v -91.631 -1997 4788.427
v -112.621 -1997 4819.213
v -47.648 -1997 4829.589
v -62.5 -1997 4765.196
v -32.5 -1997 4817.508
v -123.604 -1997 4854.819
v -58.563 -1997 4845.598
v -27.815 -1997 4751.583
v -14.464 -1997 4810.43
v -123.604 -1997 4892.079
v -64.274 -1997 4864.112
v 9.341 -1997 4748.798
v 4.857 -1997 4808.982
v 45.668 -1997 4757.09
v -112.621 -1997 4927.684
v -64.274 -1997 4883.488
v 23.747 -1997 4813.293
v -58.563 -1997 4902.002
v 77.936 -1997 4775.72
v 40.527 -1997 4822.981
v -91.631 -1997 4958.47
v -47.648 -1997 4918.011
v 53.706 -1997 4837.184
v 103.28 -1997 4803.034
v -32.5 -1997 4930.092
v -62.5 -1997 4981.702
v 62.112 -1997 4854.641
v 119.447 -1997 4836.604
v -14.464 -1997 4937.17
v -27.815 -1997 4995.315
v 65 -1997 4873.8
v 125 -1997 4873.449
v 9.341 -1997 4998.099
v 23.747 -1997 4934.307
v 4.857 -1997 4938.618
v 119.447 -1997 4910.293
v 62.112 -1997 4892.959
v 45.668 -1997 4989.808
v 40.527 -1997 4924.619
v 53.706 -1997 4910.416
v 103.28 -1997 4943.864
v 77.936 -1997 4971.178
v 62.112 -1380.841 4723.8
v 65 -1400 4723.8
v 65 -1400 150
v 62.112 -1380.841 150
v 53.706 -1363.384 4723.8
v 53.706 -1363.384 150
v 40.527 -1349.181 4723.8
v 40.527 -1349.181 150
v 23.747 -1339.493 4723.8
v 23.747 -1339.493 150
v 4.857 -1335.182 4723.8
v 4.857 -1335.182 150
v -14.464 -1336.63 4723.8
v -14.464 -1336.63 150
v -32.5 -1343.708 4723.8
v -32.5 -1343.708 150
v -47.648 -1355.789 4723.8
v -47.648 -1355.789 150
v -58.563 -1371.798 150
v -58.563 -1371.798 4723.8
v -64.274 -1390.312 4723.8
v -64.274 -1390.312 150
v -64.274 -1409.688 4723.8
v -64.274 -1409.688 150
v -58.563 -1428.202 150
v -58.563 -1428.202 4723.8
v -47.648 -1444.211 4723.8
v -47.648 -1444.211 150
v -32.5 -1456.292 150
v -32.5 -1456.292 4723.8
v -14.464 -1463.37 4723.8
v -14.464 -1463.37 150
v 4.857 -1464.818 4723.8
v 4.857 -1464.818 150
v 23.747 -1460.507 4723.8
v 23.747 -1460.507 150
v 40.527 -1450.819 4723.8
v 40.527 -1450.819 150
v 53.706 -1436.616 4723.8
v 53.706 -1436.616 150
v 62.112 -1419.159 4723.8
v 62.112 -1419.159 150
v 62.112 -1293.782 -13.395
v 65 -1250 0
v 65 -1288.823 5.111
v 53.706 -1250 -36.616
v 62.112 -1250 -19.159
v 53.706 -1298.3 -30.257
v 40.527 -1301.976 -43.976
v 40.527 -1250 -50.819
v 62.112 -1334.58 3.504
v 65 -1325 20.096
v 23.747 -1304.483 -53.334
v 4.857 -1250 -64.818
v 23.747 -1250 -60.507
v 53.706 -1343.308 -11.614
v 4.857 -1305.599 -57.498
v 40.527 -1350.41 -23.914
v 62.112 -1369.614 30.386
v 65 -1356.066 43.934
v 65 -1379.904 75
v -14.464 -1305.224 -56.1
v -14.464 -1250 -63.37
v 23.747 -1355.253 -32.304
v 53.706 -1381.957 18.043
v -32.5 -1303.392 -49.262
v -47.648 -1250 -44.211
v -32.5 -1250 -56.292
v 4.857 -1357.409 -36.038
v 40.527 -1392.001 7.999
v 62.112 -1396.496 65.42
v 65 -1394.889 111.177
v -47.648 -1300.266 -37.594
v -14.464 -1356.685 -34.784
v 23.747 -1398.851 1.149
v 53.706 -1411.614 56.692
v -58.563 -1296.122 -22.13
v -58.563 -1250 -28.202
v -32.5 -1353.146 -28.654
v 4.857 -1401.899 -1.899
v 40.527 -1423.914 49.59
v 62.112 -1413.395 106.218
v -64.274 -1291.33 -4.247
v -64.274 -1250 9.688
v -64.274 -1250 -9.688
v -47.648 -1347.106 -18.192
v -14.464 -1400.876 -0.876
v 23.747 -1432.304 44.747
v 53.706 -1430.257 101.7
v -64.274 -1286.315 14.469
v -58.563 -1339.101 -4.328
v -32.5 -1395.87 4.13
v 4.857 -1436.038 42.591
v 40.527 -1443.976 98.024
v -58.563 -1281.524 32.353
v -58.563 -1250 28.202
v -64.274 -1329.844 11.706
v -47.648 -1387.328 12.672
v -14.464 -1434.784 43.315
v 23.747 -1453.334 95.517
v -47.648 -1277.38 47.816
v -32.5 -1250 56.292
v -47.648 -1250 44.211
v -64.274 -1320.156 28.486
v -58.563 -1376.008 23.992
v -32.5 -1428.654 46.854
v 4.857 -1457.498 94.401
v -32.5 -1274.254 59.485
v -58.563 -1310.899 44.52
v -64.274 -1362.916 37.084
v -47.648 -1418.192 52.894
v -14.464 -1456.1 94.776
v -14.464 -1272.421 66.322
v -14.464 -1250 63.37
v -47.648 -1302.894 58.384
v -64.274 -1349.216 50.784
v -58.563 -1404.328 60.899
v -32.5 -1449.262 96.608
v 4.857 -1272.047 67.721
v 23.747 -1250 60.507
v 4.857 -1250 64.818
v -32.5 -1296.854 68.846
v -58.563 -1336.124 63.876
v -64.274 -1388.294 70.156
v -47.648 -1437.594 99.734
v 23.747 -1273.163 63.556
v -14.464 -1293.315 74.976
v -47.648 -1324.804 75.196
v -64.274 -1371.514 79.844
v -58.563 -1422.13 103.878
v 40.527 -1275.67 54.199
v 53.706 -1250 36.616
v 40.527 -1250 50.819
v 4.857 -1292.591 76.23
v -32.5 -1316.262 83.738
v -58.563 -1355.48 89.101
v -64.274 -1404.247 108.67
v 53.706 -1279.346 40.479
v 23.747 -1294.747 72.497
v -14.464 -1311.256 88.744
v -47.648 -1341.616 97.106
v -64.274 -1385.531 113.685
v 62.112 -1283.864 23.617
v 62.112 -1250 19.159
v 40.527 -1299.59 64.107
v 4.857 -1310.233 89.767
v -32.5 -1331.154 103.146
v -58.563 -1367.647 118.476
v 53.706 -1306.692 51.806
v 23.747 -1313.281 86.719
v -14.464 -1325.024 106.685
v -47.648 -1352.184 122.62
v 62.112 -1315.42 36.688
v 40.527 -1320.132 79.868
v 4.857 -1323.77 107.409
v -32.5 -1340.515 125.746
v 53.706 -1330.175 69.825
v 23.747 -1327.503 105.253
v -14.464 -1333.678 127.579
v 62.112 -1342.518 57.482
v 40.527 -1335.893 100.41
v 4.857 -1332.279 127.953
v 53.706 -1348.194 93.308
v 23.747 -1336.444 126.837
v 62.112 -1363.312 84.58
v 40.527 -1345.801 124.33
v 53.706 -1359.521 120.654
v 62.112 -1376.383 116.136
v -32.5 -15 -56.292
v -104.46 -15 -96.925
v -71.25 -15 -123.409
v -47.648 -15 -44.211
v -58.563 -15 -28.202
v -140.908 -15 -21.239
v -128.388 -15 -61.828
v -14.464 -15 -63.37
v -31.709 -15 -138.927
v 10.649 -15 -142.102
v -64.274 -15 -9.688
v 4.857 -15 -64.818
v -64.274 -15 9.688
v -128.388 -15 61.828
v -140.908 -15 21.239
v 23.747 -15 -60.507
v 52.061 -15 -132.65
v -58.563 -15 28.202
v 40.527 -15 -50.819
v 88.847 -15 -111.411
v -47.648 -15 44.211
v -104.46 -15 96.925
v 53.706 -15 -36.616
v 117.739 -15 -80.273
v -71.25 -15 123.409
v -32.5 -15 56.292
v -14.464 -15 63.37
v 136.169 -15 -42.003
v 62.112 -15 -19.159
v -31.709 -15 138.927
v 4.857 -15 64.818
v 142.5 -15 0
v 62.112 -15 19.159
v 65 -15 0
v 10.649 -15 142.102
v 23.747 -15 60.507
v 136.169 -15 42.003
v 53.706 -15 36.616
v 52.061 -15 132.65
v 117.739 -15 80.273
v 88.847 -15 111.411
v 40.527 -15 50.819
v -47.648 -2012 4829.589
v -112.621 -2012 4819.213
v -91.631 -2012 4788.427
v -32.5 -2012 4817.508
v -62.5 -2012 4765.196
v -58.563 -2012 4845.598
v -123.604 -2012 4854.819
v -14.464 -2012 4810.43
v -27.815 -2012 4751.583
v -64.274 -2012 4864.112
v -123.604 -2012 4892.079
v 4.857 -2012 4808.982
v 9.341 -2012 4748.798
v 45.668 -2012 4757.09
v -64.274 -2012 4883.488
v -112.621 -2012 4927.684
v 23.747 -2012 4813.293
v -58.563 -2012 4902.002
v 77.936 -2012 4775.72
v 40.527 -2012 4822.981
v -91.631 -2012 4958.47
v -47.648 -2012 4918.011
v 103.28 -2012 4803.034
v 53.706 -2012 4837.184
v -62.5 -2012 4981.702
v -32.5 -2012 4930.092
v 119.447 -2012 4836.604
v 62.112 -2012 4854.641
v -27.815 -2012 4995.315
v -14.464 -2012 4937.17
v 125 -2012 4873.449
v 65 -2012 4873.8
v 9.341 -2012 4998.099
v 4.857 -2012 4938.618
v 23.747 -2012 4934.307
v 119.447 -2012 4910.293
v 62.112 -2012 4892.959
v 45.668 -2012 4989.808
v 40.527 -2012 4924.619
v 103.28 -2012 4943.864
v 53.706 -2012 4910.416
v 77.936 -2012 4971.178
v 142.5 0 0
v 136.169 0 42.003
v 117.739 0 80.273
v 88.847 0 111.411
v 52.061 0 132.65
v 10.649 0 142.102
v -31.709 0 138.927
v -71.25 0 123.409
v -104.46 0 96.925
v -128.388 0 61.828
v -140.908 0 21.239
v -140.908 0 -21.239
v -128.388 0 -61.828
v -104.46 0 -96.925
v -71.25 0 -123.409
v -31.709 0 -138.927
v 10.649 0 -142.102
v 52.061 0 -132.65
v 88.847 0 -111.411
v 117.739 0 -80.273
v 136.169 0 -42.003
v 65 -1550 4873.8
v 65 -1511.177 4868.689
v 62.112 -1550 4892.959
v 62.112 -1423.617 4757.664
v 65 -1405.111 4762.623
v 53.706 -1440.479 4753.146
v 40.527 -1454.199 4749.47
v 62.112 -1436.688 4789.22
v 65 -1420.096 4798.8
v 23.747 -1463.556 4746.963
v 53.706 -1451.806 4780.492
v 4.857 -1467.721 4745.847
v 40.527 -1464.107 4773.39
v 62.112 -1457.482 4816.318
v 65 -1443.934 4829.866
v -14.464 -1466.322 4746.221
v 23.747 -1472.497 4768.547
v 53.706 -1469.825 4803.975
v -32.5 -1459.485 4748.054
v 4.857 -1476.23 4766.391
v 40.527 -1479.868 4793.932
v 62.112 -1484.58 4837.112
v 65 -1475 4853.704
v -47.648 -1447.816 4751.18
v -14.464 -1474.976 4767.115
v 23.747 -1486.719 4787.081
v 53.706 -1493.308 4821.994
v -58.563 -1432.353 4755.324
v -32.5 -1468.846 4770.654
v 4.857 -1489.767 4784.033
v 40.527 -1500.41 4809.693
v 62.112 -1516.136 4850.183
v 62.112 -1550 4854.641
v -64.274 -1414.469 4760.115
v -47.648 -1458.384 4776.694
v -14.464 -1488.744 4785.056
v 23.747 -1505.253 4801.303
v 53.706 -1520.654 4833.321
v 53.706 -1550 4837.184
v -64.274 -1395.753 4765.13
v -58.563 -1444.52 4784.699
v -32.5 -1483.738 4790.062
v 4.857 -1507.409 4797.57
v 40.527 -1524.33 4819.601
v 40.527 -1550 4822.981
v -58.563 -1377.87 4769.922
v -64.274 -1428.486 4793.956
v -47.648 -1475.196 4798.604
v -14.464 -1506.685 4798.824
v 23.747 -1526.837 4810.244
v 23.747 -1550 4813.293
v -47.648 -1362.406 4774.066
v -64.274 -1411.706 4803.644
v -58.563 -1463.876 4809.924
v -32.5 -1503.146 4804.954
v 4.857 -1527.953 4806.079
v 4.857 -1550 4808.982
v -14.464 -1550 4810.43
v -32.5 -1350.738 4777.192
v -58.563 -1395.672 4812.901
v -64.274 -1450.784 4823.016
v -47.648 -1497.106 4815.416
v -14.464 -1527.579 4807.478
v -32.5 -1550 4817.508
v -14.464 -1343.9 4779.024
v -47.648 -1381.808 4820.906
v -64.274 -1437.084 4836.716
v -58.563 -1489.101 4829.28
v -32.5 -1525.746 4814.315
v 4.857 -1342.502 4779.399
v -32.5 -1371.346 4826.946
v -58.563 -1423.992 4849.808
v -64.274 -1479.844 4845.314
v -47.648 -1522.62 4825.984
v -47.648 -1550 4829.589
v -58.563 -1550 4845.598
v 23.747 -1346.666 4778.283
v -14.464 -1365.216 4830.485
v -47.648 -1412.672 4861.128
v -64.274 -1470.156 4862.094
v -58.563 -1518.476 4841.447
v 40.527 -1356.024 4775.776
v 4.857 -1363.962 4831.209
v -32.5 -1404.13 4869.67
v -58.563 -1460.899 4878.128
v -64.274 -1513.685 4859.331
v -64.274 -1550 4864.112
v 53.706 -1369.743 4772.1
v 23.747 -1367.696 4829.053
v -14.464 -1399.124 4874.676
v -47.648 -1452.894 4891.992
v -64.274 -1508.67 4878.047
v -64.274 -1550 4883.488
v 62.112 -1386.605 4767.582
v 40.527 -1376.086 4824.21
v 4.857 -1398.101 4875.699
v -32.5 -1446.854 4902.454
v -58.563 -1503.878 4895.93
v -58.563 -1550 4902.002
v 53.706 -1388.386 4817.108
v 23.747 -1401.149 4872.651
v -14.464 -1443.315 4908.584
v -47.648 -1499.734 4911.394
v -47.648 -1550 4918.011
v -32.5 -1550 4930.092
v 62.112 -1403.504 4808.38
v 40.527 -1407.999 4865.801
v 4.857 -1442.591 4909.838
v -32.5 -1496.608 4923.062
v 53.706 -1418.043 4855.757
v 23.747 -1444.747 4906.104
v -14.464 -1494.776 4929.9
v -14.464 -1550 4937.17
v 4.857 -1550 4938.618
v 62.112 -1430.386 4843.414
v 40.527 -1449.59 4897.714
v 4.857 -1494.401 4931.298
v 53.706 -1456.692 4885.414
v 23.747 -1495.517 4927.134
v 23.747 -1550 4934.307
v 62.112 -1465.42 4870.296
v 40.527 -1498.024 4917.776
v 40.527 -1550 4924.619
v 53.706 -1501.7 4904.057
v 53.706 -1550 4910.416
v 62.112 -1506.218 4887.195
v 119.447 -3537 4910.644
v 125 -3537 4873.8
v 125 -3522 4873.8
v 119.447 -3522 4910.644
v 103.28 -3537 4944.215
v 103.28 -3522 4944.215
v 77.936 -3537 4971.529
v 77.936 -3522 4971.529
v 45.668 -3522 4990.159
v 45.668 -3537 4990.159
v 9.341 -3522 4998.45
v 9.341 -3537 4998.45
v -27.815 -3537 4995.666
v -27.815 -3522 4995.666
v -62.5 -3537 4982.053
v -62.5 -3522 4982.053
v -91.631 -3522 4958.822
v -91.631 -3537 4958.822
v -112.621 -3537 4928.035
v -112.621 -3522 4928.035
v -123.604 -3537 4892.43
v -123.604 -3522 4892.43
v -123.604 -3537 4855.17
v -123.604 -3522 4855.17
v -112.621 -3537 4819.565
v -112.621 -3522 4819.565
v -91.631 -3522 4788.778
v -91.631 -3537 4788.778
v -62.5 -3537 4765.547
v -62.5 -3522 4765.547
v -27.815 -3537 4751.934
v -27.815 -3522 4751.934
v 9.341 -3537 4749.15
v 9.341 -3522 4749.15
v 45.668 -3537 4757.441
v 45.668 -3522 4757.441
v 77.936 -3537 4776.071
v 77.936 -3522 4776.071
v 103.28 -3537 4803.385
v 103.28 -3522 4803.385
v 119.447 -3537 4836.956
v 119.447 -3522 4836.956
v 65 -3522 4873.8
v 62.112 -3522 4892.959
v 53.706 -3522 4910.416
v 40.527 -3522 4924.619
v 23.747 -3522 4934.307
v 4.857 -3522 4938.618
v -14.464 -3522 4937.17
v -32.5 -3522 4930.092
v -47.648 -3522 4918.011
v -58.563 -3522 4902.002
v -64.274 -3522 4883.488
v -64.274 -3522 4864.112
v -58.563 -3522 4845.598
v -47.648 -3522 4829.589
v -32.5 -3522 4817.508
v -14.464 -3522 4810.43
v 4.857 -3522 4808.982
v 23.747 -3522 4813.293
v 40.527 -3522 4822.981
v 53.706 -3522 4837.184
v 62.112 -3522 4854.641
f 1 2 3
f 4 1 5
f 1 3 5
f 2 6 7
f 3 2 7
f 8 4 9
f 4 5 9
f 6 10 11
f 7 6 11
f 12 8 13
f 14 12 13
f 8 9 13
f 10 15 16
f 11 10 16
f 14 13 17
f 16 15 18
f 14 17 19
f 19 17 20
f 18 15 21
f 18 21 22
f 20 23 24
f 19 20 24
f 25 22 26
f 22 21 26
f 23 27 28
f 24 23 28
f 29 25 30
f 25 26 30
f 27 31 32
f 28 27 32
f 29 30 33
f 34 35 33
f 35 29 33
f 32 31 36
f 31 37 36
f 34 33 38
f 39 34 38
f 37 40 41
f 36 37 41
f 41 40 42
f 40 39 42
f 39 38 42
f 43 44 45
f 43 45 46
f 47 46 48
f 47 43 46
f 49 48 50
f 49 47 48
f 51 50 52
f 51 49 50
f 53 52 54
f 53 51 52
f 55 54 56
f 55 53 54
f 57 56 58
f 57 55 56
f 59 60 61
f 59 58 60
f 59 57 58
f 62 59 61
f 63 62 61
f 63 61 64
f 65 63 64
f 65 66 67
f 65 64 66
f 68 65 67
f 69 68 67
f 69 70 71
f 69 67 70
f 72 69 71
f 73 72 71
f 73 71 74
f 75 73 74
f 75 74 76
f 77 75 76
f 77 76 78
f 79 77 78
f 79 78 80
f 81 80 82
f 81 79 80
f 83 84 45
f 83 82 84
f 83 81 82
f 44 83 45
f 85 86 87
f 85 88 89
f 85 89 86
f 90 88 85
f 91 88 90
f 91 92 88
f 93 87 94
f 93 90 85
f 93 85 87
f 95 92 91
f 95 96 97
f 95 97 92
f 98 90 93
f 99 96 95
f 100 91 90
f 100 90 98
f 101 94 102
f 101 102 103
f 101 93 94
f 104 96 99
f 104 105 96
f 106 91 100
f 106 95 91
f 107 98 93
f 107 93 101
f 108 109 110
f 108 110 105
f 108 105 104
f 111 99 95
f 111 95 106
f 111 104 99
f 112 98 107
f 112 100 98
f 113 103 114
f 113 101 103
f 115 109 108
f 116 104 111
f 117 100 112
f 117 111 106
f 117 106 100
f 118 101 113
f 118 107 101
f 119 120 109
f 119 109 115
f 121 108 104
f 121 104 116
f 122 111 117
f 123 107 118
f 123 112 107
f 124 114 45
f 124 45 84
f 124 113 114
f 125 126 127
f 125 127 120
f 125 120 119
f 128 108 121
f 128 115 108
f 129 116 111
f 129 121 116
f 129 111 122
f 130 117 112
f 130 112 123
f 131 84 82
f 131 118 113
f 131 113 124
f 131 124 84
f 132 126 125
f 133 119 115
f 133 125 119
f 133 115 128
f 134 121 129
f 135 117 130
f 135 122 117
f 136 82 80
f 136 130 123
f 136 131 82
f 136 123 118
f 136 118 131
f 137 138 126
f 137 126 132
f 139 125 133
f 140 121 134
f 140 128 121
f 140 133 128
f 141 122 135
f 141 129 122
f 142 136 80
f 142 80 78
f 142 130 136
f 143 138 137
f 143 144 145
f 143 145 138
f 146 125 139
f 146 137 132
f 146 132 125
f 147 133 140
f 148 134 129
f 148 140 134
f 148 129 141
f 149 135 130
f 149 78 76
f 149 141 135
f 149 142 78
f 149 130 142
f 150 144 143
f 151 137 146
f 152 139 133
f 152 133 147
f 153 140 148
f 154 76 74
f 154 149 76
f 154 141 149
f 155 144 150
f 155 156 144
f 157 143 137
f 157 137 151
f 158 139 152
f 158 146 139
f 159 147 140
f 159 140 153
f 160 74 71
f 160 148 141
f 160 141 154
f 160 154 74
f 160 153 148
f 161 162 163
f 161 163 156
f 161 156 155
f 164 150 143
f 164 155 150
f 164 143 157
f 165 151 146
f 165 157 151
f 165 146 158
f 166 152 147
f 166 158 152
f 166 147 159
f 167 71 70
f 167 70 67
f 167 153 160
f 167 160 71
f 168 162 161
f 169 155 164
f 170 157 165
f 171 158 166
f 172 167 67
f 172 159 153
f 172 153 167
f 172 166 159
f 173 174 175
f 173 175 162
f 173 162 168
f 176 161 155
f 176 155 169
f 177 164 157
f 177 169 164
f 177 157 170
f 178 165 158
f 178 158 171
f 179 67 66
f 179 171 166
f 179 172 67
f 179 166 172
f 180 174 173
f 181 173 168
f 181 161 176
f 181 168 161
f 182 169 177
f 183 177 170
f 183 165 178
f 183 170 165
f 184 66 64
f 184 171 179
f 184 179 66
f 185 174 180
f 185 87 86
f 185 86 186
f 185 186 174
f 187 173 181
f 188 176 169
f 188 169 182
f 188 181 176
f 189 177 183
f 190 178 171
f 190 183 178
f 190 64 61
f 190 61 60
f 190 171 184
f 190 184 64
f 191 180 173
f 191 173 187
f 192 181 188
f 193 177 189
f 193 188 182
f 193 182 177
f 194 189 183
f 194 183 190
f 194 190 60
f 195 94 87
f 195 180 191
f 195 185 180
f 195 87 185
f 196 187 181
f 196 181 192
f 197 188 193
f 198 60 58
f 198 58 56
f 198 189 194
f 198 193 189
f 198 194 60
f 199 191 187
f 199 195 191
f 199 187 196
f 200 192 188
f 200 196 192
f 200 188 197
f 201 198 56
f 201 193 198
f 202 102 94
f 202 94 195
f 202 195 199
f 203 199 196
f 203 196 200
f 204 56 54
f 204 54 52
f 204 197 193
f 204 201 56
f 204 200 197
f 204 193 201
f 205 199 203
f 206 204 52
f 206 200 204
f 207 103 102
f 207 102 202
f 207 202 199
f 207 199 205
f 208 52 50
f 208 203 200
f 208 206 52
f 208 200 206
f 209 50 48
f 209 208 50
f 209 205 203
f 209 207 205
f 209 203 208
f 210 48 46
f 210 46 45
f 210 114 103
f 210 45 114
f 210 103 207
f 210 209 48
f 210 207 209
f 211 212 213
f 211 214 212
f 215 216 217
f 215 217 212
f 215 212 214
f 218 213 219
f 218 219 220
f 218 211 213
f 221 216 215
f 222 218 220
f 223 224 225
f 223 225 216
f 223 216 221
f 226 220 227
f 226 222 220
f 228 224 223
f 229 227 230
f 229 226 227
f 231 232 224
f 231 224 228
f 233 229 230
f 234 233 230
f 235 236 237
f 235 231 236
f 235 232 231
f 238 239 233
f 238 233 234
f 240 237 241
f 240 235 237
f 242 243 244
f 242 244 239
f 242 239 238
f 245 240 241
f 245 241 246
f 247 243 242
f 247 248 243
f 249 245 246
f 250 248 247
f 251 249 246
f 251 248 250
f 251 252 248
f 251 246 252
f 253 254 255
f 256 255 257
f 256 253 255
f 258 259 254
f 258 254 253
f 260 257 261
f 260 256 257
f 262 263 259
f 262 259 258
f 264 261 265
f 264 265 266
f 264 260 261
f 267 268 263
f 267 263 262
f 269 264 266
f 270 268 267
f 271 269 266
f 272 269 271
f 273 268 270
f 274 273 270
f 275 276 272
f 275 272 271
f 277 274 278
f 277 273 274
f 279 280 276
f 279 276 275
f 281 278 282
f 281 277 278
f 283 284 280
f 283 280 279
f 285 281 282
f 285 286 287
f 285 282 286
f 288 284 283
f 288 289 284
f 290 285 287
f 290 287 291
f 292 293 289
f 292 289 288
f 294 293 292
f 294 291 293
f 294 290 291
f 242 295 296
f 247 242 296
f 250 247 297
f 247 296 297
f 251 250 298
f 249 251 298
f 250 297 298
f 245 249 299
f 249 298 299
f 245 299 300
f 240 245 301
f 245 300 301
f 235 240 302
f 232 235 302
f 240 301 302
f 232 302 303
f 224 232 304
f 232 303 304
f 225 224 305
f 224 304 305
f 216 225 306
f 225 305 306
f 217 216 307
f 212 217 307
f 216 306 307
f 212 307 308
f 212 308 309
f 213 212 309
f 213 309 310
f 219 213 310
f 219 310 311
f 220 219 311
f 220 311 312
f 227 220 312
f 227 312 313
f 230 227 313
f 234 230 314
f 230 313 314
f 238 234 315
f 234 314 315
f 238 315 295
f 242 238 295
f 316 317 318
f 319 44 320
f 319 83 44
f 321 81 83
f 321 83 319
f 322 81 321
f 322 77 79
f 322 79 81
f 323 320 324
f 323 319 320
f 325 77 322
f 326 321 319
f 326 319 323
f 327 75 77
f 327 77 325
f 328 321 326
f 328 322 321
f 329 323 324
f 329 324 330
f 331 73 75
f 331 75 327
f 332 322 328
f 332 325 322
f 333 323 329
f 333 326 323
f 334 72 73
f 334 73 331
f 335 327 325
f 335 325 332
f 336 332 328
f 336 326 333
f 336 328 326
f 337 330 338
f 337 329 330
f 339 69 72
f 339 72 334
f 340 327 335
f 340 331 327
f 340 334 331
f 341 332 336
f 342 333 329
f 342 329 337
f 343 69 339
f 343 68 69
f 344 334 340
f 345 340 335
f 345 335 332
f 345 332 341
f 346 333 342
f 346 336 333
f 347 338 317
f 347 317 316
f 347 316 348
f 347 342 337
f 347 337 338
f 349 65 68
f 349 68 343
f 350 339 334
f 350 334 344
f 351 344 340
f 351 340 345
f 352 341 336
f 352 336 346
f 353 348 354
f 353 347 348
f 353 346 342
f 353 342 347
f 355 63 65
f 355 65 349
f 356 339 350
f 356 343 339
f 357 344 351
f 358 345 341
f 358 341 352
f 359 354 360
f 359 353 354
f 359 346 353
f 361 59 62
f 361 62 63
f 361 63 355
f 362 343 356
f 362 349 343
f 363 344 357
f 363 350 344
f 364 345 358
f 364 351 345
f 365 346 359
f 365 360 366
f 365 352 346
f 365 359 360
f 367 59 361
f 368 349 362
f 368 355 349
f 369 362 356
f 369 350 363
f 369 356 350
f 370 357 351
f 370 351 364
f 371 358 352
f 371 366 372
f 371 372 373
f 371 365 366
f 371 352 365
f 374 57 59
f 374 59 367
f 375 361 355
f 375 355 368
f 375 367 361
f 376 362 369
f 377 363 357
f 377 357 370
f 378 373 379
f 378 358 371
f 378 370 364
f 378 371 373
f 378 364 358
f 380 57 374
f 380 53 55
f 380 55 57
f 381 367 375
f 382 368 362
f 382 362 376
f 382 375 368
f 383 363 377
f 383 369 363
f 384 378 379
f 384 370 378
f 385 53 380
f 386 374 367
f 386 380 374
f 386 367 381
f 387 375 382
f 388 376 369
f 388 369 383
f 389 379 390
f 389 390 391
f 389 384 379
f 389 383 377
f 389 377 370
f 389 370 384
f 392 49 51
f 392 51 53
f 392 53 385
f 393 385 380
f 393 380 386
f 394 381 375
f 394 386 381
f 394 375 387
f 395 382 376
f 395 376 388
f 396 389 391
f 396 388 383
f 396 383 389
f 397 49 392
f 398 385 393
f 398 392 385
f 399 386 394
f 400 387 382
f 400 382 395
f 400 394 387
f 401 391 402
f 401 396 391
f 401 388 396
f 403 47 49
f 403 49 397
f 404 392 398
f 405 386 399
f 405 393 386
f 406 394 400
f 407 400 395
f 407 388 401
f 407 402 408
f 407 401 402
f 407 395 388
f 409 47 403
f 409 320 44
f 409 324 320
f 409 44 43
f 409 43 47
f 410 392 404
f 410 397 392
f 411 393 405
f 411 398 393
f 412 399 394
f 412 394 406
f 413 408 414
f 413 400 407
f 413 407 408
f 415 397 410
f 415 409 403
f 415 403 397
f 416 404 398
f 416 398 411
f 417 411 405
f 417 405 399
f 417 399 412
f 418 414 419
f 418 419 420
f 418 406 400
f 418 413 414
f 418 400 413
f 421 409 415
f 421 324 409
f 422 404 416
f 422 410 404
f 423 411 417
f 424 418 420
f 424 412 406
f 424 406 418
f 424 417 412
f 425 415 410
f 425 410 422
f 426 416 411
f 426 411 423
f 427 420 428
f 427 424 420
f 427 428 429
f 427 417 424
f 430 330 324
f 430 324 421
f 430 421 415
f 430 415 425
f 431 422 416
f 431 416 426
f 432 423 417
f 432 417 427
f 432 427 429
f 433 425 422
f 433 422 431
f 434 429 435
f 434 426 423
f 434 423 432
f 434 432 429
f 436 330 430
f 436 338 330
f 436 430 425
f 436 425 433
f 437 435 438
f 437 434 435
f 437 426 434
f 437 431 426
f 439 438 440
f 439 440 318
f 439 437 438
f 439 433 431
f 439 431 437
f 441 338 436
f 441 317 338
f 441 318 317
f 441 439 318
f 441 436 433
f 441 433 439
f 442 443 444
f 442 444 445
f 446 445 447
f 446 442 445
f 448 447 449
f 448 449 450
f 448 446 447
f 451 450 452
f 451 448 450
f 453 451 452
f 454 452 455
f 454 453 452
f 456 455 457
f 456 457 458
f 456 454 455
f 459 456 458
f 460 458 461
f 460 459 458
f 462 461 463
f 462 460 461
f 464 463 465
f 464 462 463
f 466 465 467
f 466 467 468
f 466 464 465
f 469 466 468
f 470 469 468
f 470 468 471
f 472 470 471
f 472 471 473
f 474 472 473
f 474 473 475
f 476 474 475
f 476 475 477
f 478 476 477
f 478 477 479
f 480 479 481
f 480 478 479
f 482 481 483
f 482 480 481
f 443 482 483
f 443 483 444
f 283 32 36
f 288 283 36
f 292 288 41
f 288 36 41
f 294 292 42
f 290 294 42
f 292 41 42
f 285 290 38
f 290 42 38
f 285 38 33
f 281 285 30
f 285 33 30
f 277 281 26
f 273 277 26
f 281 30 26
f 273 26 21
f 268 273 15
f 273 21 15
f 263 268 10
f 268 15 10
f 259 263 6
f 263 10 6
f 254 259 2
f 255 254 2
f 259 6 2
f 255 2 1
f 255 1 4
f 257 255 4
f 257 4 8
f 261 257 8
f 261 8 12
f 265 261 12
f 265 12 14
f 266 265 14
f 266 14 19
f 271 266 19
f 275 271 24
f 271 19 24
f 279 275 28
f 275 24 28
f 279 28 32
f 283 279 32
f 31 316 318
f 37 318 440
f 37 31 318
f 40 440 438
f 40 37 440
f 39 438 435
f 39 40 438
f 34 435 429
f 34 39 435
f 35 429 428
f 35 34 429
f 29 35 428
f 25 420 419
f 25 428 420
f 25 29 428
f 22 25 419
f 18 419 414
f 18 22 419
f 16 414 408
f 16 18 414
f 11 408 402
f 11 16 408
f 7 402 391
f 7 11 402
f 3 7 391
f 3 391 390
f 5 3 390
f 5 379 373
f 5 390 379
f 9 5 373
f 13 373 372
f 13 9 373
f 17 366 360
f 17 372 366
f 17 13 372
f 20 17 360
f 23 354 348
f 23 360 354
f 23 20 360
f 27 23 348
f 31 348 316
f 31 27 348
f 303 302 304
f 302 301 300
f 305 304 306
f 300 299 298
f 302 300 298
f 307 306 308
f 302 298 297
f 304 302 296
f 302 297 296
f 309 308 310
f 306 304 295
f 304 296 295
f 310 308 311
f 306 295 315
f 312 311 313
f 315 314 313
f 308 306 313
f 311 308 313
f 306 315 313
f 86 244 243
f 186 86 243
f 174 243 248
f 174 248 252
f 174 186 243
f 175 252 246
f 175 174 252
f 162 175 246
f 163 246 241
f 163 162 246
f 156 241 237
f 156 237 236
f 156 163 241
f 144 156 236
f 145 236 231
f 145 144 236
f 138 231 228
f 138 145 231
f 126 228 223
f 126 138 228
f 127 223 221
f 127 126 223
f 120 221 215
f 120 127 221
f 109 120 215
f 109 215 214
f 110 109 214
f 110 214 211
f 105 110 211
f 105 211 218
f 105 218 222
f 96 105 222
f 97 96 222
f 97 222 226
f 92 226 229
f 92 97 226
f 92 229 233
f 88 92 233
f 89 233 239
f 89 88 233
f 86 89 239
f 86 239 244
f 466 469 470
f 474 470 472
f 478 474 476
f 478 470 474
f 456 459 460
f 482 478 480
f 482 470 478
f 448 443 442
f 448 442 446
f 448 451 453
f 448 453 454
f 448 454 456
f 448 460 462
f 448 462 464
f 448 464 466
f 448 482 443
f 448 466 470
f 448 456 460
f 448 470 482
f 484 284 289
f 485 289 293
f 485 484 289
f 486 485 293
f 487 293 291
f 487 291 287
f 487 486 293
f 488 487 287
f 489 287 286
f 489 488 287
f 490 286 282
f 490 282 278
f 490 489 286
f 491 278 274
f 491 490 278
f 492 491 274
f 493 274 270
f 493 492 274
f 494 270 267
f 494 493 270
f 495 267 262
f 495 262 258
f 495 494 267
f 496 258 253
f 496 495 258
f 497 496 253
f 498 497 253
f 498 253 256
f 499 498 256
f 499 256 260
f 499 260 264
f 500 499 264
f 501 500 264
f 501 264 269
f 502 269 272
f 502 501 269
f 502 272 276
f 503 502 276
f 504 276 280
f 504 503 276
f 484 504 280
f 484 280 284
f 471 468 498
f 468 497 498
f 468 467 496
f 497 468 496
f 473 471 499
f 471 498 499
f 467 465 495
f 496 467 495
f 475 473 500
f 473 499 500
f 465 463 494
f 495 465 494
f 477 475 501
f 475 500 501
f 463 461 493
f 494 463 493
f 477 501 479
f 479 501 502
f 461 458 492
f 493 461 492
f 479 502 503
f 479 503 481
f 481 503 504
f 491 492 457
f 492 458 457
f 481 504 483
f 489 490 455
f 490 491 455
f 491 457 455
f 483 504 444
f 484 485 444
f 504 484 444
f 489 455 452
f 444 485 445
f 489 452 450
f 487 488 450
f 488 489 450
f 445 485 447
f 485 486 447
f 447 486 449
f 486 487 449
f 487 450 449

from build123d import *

# Parameters (mm, degrees)
F0_R      = 142.5
F5_DEPTH  = 15
F2_R      = 65
F4_R      = 125
F7_DEPTH  = 15
F9_R      = 125
F10_DEPTH = 15


with BuildPart() as f5:
    # F0 (on Front) → F5 (new body)
    with BuildSketch(Plane.XZ):
        Circle(F0_R)
    extrude(amount=F5_DEPTH)

    # F6: sweep along a path in F1
    with BuildLine(Plane.YZ) as f6_path:
        Line((0, 0), (-1250, 0))
        ThreePointArc((-1250, 0), (-1356.066017, 43.933983), (-1400, 150))
        Line((-1400, 150), (-1400, 4723.8))
        ThreePointArc((-1400, 4723.8), (-1443.933983, 4829.866017), (-1550, 4873.8))
        Line((-1550, 4873.8), (-3537, 4873.8))
    # F2 (on Front) → F6 (sweep)
    with BuildSketch(Plane.XZ):
        Circle(F2_R)
    sweep(path=f6_path.line)

    # F4 (on offset) → F7 (join)
    with BuildSketch(Plane.XZ.offset(3537)):
        with Locations((0, 4873.8)):
            Circle(F4_R)
    extrude(amount=-F7_DEPTH)

    # F9 (on offset) → F10 (join)
    with BuildSketch(Plane.XZ.offset(1997)):
        with Locations((0, 4873.448849)):
            Circle(F9_R)
    extrude(amount=F10_DEPTH)


solid = f5.part
